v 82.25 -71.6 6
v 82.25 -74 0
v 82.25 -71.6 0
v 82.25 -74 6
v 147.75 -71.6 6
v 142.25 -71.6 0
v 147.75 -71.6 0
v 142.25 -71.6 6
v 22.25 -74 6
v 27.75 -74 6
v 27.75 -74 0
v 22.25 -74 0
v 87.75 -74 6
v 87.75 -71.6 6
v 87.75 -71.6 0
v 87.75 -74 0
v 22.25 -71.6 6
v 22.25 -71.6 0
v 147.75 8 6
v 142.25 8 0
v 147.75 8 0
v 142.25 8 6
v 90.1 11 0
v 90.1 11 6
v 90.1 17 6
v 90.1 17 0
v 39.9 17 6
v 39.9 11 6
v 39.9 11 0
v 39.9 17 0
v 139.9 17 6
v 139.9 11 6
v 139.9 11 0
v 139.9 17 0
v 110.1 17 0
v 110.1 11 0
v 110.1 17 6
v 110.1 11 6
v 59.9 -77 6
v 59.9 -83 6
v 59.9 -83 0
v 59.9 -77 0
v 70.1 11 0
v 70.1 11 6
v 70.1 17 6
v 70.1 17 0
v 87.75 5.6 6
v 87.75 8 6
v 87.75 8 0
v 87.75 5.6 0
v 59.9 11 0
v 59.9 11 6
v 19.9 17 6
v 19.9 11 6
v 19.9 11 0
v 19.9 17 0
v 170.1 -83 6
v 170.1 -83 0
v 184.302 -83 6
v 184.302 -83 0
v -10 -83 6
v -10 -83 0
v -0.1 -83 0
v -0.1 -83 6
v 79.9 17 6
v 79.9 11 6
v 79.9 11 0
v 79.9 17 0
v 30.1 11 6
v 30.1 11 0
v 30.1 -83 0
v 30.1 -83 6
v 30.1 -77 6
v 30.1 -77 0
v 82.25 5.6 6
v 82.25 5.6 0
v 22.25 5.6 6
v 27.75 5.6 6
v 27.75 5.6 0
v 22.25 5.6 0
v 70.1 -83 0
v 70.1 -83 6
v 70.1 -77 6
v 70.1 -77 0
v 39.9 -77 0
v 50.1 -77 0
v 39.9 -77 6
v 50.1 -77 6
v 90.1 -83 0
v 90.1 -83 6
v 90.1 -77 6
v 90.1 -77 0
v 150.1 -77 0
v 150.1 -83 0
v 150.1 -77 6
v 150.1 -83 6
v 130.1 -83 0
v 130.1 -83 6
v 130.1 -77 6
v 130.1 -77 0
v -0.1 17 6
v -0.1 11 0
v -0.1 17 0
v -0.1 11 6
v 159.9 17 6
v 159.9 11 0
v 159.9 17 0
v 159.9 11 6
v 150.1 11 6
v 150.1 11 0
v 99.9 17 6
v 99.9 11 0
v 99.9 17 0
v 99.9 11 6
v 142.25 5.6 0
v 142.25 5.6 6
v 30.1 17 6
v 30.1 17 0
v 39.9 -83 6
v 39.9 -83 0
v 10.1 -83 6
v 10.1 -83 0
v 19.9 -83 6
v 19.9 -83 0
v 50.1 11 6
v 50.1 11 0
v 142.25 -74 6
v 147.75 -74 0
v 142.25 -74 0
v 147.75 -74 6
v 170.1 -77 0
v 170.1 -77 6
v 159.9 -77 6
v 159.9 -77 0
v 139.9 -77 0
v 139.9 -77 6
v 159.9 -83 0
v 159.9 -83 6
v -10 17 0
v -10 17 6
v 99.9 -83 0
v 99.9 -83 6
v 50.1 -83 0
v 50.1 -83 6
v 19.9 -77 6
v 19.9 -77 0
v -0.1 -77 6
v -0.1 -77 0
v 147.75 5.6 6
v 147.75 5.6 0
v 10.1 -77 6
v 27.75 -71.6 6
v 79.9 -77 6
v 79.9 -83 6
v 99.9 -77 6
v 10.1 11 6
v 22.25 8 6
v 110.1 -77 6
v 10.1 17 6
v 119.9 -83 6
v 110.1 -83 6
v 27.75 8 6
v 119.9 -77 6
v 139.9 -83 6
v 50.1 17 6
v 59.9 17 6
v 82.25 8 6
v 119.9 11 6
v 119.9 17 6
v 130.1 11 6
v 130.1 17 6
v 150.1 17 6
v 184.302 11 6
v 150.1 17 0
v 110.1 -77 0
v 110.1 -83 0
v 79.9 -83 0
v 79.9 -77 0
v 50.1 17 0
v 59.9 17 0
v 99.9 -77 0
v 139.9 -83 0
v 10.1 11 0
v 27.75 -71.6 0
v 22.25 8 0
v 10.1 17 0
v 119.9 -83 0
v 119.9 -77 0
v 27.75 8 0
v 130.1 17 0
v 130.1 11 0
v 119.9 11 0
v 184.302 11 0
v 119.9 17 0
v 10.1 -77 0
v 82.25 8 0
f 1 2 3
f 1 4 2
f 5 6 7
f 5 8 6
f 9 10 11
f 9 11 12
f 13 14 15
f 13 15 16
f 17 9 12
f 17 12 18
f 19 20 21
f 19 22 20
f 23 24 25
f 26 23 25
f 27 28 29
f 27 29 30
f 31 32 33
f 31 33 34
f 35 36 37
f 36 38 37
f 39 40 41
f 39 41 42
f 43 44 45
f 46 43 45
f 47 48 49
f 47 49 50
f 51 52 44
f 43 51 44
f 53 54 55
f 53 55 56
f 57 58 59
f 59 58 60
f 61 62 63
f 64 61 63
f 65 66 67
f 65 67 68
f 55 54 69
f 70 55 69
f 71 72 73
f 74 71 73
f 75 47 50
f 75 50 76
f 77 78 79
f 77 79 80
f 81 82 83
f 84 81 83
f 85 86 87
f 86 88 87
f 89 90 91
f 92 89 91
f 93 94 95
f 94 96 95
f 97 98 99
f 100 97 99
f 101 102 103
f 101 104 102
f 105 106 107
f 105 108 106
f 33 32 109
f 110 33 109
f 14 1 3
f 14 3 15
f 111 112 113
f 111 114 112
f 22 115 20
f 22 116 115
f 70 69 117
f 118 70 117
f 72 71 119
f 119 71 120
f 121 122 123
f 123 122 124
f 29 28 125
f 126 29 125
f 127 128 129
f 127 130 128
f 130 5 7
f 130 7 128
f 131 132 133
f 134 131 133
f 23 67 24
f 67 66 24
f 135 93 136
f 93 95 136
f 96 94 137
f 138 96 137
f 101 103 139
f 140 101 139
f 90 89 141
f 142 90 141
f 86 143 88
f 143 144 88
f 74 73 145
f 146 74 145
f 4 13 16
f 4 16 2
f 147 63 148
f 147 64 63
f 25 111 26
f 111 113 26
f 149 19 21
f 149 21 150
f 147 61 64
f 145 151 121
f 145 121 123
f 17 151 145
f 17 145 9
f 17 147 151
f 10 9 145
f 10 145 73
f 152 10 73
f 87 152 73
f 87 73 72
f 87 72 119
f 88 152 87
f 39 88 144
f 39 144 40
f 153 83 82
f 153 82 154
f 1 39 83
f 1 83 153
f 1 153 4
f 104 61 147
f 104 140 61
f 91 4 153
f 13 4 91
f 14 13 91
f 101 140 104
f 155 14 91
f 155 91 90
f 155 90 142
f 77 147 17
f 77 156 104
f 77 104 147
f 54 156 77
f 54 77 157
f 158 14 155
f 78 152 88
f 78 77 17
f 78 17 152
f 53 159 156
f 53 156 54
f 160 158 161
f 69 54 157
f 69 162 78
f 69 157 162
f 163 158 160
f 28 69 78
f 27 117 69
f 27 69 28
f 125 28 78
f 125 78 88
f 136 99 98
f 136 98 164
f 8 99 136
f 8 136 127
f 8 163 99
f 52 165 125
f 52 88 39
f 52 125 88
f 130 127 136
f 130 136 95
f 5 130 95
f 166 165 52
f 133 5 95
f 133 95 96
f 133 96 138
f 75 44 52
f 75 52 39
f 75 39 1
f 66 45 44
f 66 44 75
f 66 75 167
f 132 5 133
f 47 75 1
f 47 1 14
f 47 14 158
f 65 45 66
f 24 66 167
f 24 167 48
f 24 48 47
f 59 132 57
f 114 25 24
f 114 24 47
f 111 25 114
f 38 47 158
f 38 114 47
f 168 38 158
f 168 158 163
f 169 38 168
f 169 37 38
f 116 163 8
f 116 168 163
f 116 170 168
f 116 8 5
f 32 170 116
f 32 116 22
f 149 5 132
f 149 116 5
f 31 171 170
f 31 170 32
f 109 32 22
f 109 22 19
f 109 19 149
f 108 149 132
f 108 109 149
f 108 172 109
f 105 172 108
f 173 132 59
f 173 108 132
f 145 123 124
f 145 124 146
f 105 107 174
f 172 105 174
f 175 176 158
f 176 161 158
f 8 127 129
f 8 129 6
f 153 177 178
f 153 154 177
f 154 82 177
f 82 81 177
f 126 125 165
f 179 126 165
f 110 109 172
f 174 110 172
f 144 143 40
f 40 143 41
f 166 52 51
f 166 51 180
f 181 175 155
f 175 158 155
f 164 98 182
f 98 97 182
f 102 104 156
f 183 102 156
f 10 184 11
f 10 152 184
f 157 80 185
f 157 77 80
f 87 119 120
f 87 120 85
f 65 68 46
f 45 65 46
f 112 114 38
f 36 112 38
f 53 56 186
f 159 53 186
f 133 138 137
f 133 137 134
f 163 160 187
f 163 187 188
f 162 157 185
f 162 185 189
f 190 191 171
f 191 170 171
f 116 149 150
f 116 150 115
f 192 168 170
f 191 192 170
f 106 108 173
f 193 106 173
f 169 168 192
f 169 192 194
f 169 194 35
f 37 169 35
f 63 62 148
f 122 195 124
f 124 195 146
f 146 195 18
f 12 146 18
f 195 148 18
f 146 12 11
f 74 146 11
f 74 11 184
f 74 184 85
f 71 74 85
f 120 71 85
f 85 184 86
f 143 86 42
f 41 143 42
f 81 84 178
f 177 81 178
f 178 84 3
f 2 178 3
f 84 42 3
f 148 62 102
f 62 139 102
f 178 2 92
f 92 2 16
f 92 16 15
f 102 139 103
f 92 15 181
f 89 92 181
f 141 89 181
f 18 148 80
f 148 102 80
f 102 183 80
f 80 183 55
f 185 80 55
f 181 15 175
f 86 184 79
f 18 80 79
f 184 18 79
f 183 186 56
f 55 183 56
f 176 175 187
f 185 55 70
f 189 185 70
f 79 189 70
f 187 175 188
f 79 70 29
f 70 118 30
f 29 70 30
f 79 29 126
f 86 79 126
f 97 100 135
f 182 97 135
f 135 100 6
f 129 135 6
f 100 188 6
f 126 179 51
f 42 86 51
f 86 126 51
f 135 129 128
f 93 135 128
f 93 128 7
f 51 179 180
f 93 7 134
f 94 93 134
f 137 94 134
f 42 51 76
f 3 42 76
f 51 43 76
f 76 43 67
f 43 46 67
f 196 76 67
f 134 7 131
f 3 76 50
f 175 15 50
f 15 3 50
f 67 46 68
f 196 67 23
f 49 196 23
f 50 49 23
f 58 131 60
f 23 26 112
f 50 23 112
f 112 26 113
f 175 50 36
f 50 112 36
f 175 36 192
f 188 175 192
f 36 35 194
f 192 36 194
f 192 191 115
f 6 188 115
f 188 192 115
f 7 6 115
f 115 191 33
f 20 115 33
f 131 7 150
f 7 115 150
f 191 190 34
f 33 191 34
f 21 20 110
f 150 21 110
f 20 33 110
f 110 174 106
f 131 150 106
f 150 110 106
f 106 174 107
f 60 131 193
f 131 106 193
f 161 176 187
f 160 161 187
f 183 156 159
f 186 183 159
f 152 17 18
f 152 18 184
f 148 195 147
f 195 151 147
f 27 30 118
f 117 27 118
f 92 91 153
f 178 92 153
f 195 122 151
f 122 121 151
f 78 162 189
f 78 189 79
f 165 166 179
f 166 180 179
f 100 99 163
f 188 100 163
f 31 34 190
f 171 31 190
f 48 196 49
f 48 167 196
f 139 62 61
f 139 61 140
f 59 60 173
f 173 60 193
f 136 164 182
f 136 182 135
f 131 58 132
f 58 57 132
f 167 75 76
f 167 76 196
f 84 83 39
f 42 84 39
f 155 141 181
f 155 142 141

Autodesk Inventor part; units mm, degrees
ref_plane "YZ Plane" through (0, 0, 0) normal (1, 0, 0) x (0, 1, 0)
ref_plane "XZ Plane" through (0, 0, 0) normal (0, 1, 0) x (-1, 0, 0)
ref_plane "XY Plane" through (0, 0, 0) normal (0, 0, 1) x (1, 0, 0)
sketch "Sketch1" plane through (0, 0, 0) normal (0, 0, 1) x (1, 0, 0)
  line L0 (184.3024, 11) -> (184.3024, 17) projected
  line L1 (-10, 11) -> (-10, 17) projected
  line L2 (184.3024, 17) -> (0, 17)
  line L3 (0, 17) -> (0, -83)
  line L4 (0, -83) -> (184.3024, -83)
  line L5 (184.3024, -83) -> (184.3024, 17)
  line L6 (-10, 17) -> (0, 17)
  line L7 (0, 17) -> (0, -83)
  line L8 (0, -83) -> (-10, -83)
  line L9 (-10, -83) -> (-10, 17)
  point P0 (0, 0)
  point P1 (-10, 6)
  point P2 (-10, 0)
  dimension "d0" = 100
extrude "Extrusion1" add sketch "Sketch1" along normal blind 6
sketch "Sketch4" plane through (0, 0, 6) normal (0, 0, 1) x (1, 0, 0)
  line L0 (160, 11) -> (184.3024, 11) projected
  line L1 (160, 17) -> (160, 11) projected
  line L2 (184.3024, 17) -> (-10, 17) projected
  line L3 (184.3024, -83) -> (184.3024, 17) projected
  line L4 (0, 11) -> (-10, 11) projected
  line L5 (0, 17) -> (0, 0) projected
  line L6 (-10, 17) -> (-10, -83) projected
  point P0 (-10, 11)
extrude "Extrusion4" cut sketch "Sketch4" against normal blind 6 contours L1 L2 L3 L0
sketch "Sketch5" plane through (0, 0, 6) normal (0, 0, 1) x (1, 0, 0)
  line L0 (140, 11) -> (150, 11) projected
  line L1 (150, 11) -> (150, 17) projected
  line L2 (140, 17) -> (140, 11) projected
  line L3 (184.3024, 17) -> (-10, 17) projected
  line L4 (150, 11) -> (150.1, 11)
  line L5 (150.1, 11) -> (150.1, 17)
  line L6 (150.1, 17) -> (150, 17)
  line L7 (150, 17) -> (150, 11)
  line L8 (140, 11) -> (139.9, 11)
  line L9 (139.9, 11) -> (139.9, 17)
  line L10 (139.9, 17) -> (140, 17)
  line L11 (140, 17) -> (140, 11)
  point P0 (0, 0)
  point P1 (160, 17)
  point P2 (0, 6)
  point P3 (150.1, 17)
  point P4 (139.9, 17)
  point P5 (-10, 17)
  point P6 (184.3024, 17)
  dimension "d21" = 0.1
  dimension "d22" = 6
  dimension "d23" = 0.1
  dimension "d24" = 6
extrude "Extrusion5" cut sketch "Sketch5" against normal blind 6
pattern_linear "Rectangular Pattern3" count 8 spacing 20 along (-1, 0, 0) of "Extrusion5"
ref_plane "Work Plane1" through (-10, -33, 0) normal (0, -1, 0) x (1, 0, 0)
mirror "Mirror1" about plane through (-10, -33, 0) normal (0, -1, 0) of "Extrusion5"
pattern_linear "Rectangular Pattern4" count 2 spacing 20 along (1, 0, 0) count 8 spacing 20 along (-1, 0, 0) of "Extrusion5", "Mirror1"
sketch "Sketch6" plane through (0, 0, 6) normal (0, 0, 1) x (1, 0, 0)
  line L0 (167.75, 6.6) -> (162.25, 6.6)
  line L1 (162.25, 6.6) -> (162.25, 9)
  line L2 (162.25, 9) -> (167.75, 9)
  line L3 (167.75, 9) -> (167.75, 6.6)
  line L4 (159.9, 11) -> (159.9, 17) projected
  line L5 (184.3024, 11) -> (160, 11) projected
  line L6 (147.75, 5.6) -> (142.25, 5.6)
  line L7 (142.25, 5.6) -> (142.25, 8)
  line L8 (142.25, 8) -> (147.75, 8)
  line L9 (147.75, 8) -> (147.75, 5.6)
  line L10 (150.1, 11) -> (139.9, 11) projected
  line L11 (139.9, 11) -> (139.9, 17) projected
  point P0 (0, 0)
  dimension "d36" = 5.5
  dimension "d37" = 2.4
  dimension "d38" = 2.35
  dimension "d39" = 2
  dimension "d48" = 5.5
  dimension "d49" = 2.4
  dimension "d50" = 3
  dimension "d51" = 2.35
extrude "Extrusion6" cut sketch "Sketch6" against normal blind 6 contours L6 L7 L8 L9
pattern_linear "Rectangular Pattern5" count 3 spacing 60 along (-1, 0, 0) of "Extrusion6"
mirror "Mirror2" about plane through (-10, -33, 0) normal (0, -1, 0) of "Extrusion6", "Rectangular Pattern5"
properties part number "00_Baseplate_Simmo_side5_v2"
